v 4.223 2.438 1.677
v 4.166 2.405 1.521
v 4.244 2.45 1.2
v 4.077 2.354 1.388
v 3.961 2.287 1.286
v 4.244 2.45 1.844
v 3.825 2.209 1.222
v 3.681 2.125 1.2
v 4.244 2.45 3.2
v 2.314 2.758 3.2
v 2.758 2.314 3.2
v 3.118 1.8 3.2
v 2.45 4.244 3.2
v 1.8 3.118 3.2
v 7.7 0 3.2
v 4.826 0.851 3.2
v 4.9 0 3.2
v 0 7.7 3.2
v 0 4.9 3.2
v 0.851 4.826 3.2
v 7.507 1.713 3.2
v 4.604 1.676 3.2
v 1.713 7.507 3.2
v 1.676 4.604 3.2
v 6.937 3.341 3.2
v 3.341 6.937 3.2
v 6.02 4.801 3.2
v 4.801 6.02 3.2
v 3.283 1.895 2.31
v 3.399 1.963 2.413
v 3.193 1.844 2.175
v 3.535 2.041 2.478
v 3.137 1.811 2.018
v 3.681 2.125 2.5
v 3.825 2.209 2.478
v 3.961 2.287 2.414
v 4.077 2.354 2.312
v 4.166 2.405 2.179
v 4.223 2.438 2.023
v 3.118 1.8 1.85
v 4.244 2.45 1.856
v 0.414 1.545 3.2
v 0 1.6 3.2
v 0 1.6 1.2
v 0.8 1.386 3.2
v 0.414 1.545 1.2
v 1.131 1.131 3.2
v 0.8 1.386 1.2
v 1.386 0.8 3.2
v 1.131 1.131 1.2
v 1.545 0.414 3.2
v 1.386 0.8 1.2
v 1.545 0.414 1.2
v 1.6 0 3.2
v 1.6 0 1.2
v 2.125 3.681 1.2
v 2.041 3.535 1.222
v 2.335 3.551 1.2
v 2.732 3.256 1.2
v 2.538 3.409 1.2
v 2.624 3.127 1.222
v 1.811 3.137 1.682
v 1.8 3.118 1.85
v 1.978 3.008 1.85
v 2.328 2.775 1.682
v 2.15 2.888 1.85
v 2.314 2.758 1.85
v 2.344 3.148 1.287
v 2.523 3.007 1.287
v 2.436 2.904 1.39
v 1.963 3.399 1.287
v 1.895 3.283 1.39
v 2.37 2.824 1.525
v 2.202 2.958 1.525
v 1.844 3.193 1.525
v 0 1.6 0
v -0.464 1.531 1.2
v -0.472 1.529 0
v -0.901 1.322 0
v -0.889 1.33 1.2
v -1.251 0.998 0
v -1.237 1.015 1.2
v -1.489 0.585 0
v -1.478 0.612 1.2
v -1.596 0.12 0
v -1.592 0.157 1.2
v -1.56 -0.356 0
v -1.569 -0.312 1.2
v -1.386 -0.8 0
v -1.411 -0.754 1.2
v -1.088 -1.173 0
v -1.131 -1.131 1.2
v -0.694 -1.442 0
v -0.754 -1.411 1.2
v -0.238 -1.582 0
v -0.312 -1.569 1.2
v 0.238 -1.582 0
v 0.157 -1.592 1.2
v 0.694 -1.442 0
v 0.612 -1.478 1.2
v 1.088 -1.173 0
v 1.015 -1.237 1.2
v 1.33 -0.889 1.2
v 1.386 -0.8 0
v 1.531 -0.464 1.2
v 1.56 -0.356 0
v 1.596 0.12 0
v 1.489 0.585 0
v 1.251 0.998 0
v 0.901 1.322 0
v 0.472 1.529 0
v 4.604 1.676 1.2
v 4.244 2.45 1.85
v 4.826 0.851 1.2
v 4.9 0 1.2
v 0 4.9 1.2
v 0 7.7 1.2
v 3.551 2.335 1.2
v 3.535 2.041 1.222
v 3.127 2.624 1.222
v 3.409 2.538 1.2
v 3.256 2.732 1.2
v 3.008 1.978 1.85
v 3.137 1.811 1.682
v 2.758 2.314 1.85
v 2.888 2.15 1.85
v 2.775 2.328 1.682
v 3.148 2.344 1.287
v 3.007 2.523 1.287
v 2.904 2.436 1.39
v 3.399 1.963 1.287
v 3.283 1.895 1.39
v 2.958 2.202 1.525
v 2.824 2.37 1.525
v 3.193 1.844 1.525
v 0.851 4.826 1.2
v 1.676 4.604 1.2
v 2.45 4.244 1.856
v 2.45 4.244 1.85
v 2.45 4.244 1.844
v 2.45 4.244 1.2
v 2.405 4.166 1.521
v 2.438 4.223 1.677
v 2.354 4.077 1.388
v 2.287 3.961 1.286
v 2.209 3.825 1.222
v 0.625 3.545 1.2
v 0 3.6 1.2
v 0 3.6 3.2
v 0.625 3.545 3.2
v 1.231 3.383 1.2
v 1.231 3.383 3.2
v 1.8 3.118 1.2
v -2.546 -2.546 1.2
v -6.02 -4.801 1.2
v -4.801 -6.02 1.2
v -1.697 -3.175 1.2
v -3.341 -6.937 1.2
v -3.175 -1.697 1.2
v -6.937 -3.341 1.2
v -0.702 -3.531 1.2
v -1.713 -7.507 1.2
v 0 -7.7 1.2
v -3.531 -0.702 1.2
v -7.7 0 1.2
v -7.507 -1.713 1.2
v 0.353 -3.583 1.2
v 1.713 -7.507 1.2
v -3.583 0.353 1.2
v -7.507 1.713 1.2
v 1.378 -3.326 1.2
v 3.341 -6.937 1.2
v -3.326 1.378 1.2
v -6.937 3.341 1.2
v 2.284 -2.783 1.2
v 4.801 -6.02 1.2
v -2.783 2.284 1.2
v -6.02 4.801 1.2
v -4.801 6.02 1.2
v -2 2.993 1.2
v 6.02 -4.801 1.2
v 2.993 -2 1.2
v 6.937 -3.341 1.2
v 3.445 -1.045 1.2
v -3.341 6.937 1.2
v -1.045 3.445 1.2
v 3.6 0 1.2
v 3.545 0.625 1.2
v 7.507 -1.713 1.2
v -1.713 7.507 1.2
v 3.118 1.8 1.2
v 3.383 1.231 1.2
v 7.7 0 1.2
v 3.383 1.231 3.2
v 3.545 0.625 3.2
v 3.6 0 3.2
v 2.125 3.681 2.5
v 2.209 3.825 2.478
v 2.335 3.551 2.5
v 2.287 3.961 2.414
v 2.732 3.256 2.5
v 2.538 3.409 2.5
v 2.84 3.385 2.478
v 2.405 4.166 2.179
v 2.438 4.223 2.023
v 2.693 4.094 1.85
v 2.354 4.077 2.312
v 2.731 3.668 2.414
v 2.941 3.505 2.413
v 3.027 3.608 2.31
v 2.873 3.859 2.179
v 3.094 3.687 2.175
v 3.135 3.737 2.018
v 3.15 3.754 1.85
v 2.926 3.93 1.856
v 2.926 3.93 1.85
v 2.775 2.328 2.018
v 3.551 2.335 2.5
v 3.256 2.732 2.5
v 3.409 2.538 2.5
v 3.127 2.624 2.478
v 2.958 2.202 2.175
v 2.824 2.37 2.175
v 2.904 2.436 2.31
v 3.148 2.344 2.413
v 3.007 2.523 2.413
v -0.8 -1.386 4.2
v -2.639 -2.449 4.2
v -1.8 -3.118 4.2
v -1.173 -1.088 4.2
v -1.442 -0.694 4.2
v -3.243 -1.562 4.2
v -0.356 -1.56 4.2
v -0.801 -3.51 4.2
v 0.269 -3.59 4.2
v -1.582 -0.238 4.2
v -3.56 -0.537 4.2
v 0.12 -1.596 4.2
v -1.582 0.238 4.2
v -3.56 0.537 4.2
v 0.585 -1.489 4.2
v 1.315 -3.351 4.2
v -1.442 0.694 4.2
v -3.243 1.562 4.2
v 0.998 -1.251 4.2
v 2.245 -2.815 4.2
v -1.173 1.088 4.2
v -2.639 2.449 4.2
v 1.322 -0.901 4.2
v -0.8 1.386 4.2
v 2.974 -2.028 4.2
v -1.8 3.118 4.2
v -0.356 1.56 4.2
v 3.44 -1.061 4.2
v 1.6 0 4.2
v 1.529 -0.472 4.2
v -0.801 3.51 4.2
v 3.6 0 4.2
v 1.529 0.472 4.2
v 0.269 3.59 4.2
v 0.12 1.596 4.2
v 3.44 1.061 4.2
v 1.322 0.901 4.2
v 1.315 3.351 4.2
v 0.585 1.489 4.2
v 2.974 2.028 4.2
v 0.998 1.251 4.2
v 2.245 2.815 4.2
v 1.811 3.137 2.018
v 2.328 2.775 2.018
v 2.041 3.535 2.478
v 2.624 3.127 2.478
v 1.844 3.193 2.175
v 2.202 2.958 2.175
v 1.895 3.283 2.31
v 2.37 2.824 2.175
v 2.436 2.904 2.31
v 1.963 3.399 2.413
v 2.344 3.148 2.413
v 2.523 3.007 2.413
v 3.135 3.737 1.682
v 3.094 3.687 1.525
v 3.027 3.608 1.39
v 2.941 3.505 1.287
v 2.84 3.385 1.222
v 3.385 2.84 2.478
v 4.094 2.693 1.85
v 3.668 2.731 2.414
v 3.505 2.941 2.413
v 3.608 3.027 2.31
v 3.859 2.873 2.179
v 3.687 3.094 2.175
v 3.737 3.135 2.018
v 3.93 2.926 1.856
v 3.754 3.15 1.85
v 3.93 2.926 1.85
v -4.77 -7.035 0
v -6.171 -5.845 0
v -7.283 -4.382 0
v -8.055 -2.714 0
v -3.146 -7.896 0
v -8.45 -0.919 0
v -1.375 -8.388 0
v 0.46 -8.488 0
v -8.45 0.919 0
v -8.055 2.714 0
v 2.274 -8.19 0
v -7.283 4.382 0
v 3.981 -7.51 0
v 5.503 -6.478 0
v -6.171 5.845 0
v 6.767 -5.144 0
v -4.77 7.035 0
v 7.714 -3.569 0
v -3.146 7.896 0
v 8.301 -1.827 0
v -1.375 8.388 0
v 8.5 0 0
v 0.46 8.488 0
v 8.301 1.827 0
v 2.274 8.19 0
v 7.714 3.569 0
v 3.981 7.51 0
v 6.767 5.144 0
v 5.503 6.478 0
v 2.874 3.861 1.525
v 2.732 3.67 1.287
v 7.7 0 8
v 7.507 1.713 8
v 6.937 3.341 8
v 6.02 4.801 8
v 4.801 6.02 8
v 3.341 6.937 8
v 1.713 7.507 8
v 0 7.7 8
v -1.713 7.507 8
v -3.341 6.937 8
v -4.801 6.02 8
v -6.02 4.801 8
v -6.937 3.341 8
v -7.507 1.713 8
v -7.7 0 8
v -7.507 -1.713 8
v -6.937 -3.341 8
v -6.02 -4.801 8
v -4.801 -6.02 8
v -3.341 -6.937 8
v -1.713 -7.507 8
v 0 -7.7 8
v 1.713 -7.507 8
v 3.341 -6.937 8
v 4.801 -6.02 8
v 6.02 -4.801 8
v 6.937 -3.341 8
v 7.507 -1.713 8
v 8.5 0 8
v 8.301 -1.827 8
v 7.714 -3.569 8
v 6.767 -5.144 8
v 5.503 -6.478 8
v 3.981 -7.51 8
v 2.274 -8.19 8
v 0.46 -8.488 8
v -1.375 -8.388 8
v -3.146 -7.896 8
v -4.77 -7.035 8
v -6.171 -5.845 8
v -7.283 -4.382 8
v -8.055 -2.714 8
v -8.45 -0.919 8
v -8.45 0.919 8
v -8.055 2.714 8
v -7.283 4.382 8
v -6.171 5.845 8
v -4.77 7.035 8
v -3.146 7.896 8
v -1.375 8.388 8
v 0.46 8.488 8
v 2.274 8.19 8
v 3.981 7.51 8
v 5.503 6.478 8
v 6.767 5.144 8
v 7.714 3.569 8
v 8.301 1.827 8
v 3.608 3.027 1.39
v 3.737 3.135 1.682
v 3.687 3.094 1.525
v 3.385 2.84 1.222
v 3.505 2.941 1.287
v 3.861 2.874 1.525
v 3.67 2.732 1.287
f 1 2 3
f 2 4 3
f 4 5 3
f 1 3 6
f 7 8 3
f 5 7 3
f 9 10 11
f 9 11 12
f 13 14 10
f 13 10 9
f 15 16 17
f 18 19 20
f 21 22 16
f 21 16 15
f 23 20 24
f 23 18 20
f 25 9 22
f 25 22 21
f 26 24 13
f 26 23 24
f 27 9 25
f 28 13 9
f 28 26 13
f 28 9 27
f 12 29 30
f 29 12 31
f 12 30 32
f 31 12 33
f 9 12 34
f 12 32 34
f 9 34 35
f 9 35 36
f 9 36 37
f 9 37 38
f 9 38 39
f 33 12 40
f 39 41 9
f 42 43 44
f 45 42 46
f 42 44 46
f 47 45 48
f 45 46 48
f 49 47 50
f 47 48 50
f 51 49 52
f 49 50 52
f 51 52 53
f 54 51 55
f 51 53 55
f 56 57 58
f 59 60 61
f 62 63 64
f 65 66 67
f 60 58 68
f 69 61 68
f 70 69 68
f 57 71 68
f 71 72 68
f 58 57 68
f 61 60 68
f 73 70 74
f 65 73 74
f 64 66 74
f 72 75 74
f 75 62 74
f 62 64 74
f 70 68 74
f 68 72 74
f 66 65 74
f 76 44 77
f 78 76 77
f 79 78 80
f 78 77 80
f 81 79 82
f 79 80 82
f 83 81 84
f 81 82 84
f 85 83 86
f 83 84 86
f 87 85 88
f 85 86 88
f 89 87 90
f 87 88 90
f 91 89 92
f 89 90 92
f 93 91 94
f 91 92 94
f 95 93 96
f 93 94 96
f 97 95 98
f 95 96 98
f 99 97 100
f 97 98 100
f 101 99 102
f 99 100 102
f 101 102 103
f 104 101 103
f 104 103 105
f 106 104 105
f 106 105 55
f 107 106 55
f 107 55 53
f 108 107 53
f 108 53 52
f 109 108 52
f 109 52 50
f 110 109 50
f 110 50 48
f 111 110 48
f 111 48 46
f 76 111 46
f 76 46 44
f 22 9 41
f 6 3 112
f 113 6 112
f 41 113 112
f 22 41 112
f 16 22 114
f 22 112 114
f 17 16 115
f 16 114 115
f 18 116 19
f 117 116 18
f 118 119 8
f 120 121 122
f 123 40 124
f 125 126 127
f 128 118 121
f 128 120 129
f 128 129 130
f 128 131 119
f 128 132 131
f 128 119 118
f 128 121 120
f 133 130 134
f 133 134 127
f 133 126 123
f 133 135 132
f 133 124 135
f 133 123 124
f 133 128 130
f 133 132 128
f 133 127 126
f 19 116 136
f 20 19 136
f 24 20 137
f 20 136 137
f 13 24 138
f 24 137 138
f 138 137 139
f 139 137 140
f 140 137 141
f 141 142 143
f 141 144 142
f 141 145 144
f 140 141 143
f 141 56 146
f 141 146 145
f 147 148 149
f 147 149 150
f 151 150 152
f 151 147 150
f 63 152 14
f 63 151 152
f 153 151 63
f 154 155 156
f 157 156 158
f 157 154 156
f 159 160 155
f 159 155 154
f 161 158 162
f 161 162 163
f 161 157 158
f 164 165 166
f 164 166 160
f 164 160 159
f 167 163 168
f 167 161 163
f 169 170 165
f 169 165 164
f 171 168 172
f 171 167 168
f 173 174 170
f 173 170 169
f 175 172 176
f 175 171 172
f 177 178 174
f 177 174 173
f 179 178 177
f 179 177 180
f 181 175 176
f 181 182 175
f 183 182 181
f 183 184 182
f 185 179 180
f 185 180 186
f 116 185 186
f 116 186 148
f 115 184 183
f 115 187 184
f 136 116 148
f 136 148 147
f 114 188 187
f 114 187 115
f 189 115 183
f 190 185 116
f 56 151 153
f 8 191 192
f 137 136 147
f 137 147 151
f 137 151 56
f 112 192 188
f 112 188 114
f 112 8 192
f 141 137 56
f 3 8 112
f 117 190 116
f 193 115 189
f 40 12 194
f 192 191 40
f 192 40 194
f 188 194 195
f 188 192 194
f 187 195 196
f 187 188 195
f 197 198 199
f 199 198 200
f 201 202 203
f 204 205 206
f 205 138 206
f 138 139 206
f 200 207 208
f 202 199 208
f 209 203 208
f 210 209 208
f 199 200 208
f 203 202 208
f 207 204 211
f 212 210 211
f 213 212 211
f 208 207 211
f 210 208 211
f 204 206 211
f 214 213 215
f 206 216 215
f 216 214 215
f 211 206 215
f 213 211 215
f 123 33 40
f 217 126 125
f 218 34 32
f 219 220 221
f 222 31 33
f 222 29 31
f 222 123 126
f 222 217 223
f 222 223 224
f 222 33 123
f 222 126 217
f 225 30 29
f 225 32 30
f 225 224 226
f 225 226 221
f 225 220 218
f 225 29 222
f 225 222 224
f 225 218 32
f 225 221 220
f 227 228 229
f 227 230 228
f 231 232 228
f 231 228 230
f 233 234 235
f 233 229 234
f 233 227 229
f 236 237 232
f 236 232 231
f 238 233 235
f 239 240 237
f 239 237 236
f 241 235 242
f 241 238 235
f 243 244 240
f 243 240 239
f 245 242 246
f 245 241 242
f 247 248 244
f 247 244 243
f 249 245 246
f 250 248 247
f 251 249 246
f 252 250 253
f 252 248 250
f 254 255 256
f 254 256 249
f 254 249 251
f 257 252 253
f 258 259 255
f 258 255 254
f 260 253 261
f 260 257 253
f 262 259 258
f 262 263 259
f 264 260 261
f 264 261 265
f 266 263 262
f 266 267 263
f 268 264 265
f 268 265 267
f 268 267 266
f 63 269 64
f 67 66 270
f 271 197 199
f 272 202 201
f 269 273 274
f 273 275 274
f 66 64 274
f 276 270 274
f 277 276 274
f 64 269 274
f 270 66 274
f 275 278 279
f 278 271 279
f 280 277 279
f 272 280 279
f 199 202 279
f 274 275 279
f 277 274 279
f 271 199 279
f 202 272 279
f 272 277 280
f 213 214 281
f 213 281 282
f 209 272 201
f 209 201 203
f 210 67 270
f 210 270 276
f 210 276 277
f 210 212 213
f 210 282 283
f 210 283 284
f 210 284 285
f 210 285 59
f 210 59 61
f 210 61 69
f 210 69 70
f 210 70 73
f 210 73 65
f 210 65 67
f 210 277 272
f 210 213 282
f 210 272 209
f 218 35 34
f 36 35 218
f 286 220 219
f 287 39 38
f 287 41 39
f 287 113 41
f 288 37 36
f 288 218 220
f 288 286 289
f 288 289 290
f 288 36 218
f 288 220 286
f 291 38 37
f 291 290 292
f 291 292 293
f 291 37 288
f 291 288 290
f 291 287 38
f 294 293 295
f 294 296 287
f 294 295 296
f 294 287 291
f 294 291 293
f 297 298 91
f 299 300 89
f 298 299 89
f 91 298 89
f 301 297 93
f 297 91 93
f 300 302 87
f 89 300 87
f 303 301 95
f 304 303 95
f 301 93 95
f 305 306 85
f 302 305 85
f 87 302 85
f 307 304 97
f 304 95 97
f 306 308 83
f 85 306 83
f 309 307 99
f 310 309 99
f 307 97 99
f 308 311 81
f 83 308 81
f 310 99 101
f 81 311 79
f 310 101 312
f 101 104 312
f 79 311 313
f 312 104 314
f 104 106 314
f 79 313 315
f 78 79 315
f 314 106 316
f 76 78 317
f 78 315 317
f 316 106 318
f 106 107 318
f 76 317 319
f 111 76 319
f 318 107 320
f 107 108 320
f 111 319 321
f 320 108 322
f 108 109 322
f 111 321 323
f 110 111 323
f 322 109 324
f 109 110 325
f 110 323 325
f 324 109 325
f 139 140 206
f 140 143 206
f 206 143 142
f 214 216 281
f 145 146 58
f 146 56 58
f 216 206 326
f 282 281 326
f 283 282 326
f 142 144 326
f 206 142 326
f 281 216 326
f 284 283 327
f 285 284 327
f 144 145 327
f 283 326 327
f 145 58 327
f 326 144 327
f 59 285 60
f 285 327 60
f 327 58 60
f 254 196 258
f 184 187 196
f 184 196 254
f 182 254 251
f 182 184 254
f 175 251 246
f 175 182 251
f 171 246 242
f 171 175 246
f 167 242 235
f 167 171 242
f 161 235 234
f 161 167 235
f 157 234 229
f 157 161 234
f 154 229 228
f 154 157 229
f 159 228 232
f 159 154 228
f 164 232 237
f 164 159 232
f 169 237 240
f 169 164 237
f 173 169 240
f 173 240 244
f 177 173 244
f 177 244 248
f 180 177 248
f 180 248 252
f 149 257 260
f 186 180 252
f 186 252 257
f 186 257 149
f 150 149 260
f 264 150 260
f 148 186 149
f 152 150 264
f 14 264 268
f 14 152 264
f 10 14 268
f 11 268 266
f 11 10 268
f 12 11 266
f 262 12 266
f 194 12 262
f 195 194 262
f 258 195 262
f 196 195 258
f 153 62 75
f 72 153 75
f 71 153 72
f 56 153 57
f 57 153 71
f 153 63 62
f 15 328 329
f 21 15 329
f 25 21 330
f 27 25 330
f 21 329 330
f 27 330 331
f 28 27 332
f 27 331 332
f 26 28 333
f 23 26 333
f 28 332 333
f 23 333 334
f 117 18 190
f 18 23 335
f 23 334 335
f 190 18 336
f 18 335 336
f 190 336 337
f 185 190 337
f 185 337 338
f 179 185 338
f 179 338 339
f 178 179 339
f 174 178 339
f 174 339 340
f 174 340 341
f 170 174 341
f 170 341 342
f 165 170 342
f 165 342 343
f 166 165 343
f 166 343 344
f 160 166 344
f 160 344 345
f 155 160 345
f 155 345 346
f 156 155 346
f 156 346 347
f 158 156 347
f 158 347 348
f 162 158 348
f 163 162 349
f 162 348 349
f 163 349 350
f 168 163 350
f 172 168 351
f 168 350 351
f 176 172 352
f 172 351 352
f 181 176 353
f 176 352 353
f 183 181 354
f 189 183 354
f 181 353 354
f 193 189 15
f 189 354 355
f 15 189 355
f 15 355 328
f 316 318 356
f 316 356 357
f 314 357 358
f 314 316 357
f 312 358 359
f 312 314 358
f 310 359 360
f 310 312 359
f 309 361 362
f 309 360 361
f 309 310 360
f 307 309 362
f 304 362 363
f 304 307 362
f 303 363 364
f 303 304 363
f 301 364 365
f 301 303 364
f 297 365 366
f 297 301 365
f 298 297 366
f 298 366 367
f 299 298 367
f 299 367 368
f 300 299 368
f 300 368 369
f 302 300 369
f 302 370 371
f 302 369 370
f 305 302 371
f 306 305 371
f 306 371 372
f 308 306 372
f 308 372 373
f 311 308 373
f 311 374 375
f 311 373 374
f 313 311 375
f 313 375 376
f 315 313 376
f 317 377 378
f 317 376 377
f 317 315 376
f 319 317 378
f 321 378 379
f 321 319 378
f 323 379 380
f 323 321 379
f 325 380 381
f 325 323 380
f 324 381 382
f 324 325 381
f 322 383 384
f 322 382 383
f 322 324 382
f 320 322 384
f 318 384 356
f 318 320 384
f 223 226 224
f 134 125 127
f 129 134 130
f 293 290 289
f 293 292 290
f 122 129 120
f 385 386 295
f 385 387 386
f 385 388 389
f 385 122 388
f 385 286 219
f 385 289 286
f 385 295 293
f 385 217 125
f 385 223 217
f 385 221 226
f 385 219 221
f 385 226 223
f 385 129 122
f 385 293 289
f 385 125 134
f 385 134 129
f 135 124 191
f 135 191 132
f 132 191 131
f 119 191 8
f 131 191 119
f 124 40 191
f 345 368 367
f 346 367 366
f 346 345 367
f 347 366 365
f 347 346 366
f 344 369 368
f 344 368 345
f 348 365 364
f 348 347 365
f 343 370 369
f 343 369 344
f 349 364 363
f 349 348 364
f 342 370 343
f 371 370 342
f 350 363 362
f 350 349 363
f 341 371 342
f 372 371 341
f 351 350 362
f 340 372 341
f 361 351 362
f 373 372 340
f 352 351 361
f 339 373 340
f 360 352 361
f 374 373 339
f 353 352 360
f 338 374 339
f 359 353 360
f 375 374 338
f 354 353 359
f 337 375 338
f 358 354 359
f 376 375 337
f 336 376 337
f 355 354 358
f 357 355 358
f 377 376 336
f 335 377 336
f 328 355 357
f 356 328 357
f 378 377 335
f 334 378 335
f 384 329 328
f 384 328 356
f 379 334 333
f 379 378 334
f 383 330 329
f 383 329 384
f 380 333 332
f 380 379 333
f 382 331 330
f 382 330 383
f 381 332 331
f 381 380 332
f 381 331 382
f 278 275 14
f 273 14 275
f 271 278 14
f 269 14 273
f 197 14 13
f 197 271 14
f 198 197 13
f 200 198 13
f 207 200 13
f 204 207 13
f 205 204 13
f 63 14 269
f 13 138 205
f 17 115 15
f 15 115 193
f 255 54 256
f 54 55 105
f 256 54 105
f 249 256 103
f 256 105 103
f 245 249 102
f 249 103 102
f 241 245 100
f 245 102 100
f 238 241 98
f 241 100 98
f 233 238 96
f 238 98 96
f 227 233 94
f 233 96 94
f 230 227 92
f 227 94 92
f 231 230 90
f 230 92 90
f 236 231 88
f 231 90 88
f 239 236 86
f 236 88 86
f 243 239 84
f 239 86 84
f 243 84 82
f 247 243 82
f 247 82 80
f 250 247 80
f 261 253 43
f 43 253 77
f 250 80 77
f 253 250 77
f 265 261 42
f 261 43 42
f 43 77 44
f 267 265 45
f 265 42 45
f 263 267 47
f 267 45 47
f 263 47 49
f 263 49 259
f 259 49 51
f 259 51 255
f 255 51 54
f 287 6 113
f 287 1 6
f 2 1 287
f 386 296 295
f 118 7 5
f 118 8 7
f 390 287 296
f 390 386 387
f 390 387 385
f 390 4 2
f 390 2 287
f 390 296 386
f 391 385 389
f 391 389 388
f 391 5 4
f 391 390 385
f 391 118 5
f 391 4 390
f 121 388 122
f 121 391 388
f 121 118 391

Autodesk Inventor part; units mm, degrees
ref_plane "YZ Plane" through (0, 0, 0) normal (1, 0, 0) x (0, 1, 0)
ref_plane "XY Plane" through (0, 0, 0) normal (0, 0, 1) x (1, 0, 0)
sketch "Sketch1" plane through (0, 0, 0) normal (0, 0, 1) x (1, 0, 0)
  circle A0 centre (0, 0) radius 8.5
  dimension "d0" = 17
extrude "Extrusion1" add sketch "Sketch1" along normal blind 8
sketch "Sketch2" plane through (0, 0, 8) normal (0, 0, 1) x (1, 0, 0)
  circle A0 centre (0, 0) radius 7.7
  circle A1 centre (0, 0) radius 8.5 projected
  dimension "d3" = 0.8
extrude "Extrusion2" cut sketch "Sketch2" against normal blind 6.8 contours A0
sketch "Sketch3" plane through (0, 0, 0) normal (0, 0, -1) x (-1, 0, 0)
  point P0 (0, 0)
hole "Hole1" at (0, 0, 0) direction (0, 0, 1) diameter 3.2 end through all clearance for "Flat Head Machine Screw" size "M3" standard "Ansi Metric M Profile"
sketch "Sketch4" plane through (0, 0, 1.2) normal (0, 0, 1) x (1, 0, 0)
  circle A0 centre (0, 0) radius 1.6 projected
  circle A1 centre (0, 0) radius 7.7 projected
  line L0 (-11.9, 0) -> (11.9, 0) projected
  line L1 (0, -11.9) -> (0, 11.9) projected
  circle A2 centre (0, 0) radius 3.6
  circle A3 centre (0, 0) radius 4.9
  line L2 (0, 0) -> (2.45, 4.2435)
  line L3 (0, 0) -> (4.2435, 2.45)
  point P0 (0, 7.7)
  point P1 (0, 1.6)
  point P2 (1.6, 0)
  point P3 (7.7, 0)
  point P4 (3.6, 0)
  point P5 (3.1177, 1.8)
  point P6 (4.9, 0)
  point P7 (0, 4.9)
  point P8 (1.8, 3.1177)
  point P9 (0, 3.6)
  dimension "d15" = 30
  dimension "d16" = 30
  dimension "d17" = 9.8
  dimension "d18" = 7.2
extrude "Extrusion3" add sketch "Sketch4" along normal blind 2 contours A0 L3 A2 L0 | A0 L2 A2 L3 | A0 L1 A2 L2 | A2 L2 A3 L3 | A3 L1 A1 L0 picked at (4.6569, 4.8582)
extrude "Extrusion4" add sketch "Sketch4" along normal blind 3 contours L0 A2 L1 A0 | A0 L3 A2 L0 | A0 L2 A2 L3 | L1 A2 L0 A0 | A0 L1 A2 L2 | L0 A2 L1 A0
sketch "Sketch5" plane through (1.8, 3.1177, 1.2) normal (-0.866, 0.5, 0) x (0, 0, 1)
  line L0 (0, 0) -> (0, 1.3) projected
  line L1 (0, 0) -> (2, 0) projected
  line L2 (2, 1.3) -> (2, 0) projected
  line L3 (0, 1.3) -> (2, 1.3) projected
  circle A0 centre (0.65, 0.65) radius 0.65
  line L4 (0, 1.3) -> (2, 1.3) projected
  line L5 (0, 0) -> (2, 0) projected
  line L6 (-2.8, -3.6) -> (8.4, -3.6) projected
  point P0 (-1.2, -3.6)
revolve "Revolution1" cut sketch "Sketch5" angle 10 about axis through (0, 0, -10) along (0, 0, -1) contours A0
ref_plane "Work Plane1" through (0, 0, 0) normal (-0.7071, 0.7071, 0) x (0, 0, 1)
mirror "Mirror1" about plane through (0, 0, 0) normal (-0.7071, 0.7071, 0) of "Revolution1"
properties part number "RewingingSpoolBushing"
